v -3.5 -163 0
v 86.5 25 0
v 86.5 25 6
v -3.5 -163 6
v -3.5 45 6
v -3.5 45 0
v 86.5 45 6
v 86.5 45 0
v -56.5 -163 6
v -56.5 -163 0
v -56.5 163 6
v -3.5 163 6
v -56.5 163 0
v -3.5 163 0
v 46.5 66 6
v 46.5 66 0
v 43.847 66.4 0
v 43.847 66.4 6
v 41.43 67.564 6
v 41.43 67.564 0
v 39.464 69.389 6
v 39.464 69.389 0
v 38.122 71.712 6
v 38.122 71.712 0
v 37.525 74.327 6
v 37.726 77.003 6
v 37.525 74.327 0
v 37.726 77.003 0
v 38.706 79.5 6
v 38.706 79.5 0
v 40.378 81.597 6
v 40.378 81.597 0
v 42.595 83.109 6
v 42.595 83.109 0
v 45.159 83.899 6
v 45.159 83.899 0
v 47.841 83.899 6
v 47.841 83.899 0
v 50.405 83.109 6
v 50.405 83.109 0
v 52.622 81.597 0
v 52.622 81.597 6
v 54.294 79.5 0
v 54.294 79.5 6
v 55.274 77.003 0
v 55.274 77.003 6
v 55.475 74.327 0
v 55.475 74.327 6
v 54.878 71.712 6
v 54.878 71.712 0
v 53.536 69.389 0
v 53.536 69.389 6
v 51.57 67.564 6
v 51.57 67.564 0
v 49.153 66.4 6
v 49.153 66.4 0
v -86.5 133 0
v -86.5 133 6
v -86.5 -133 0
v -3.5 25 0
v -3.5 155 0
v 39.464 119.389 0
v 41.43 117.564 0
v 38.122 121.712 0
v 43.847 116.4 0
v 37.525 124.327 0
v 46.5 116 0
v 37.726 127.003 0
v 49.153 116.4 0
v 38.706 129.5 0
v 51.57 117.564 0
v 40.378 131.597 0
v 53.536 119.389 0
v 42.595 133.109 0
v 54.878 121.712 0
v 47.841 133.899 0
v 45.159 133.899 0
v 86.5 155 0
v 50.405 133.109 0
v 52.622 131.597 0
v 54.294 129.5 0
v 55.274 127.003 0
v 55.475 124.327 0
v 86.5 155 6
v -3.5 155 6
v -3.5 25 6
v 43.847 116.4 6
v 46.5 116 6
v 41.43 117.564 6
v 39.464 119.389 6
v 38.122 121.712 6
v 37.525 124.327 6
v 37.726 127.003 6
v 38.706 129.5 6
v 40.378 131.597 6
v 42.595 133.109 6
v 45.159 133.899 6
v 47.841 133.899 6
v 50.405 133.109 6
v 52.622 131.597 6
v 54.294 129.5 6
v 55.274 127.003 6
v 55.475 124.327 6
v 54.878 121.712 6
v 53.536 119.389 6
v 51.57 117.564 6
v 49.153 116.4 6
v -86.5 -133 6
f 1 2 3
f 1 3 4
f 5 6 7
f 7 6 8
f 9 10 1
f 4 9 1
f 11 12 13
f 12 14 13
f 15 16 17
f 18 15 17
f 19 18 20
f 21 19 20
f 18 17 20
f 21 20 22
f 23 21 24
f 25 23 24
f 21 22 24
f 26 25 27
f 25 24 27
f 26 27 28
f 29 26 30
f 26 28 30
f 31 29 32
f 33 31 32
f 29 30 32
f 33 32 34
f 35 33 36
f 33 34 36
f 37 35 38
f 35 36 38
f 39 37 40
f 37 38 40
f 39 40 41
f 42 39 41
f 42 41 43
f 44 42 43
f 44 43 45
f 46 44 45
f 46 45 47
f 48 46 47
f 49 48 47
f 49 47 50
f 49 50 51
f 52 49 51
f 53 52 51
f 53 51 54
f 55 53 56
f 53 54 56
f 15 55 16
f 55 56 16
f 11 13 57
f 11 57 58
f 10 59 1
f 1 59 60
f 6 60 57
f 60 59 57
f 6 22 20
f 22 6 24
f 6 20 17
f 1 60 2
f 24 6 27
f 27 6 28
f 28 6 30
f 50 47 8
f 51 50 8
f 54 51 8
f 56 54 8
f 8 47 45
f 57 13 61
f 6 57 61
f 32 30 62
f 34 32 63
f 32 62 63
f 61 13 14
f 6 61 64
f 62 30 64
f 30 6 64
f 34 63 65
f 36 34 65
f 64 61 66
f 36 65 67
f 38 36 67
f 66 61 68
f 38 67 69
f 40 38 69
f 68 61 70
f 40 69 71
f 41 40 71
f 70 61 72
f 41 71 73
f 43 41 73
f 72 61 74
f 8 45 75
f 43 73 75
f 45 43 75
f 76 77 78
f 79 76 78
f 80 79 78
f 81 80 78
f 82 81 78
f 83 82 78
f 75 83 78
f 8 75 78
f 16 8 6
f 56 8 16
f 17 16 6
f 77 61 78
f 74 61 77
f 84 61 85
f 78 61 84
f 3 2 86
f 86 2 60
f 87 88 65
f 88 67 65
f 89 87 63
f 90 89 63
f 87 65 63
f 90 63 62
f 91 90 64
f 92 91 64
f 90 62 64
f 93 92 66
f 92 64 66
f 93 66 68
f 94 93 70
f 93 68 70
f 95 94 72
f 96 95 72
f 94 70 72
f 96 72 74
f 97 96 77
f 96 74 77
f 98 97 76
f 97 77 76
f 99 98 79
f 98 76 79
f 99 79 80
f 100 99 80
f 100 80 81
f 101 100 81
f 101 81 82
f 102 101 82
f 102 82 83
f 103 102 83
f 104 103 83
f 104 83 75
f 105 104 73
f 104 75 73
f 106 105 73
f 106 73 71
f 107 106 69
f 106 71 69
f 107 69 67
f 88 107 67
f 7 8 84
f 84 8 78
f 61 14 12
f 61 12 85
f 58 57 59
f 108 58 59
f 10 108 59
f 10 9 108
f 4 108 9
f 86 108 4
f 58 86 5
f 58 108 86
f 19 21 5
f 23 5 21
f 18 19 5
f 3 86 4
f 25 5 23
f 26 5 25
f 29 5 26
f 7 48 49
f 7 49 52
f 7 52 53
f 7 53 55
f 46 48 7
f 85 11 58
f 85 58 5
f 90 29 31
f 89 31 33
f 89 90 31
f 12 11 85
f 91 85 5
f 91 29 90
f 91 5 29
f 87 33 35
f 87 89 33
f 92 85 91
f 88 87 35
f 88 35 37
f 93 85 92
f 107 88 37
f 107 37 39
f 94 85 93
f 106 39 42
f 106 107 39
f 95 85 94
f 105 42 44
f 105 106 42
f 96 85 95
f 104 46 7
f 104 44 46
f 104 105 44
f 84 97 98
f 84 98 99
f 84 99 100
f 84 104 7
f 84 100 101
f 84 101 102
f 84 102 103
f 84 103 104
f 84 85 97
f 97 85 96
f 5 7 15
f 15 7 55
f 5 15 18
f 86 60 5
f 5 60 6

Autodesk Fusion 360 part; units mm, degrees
sketch "スケッチ1" plane through (0, 0, 0) normal (0, 0, 1) x (1, 0, 0)
  line L0 (-86.5, -163) -> (-3.5, -163)
  line L1 (86.5, 45) -> (86.5, 155)
  line L2 (-3.5, 163) -> (-86.5, 163)
  line L3 (-86.5, 163) -> (-86.5, -163)
  line L4 (-86.5, -163) -> (82.2546, 155) construction
  line L5 (39.184, -73.838) -> (-86.5, 163) construction
  line L6 (-3.5, 163) -> (-3.5, 155)
  line L7 (-3.5, 155) -> (86.5, 155)
  line L8 (-86.5, -163) -> (-3.5, -163) construction
  line L9 (86.5, 25) -> (-3.5, -163)
  line L10 (86.5, 25) -> (-3.5, 25)
  line L11 (-3.5, 25) -> (-3.5, 45)
  line L12 (-3.5, 45) -> (86.5, 45)
  dimension "d5" = 83
  dimension "d7" = 90
  dimension "d8" = 20
extrude "押し出し1" add sketch "スケッチ1" along normal blind 6
chamfer "面取り1" distance 30 angle 45 2 edges at (-86.5, -163, 3) (-86.5, 163, 3)
sketch "スケッチ2" plane through (0, 0, 6) normal (0, 0, 1) x (-1, 0, 0)
  line L0 (56.5, -163) -> (86.5, -133)
  line L1 (86.5, -133) -> (86.5, 133)
  line L2 (86.5, 133) -> (56.5, 163)
  line L3 (56.5, 163) -> (3.5, 163)
  line L4 (3.5, 163) -> (-86.5, -25)
  line L5 (-86.5, -25) -> (3.5, -25)
  line L6 (3.5, -25) -> (3.5, -45)
  line L7 (3.5, -45) -> (-86.5, -45)
  line L8 (-86.5, -45) -> (-86.5, -155)
  line L9 (-86.5, -155) -> (3.5, -155)
  line L10 (3.5, -155) -> (3.5, -163)
  line L11 (3.5, -163) -> (56.5, -163)
  line L12 (-86.5, -155) -> (-46.5, -155) construction
  line L13 (-46.5, -155) -> (-46.5, -125) construction
  line L14 (-46.5, -125) -> (-86.5, -125) construction
  line L15 (-86.5, -125) -> (-86.5, -155) construction
  line L16 (-46.5, -125) -> (-46.5, -75) construction
  point P0 (-46.5, -125)
  point P1 (-46.5, -75)
  dimension "d12" = 40
  dimension "d13" = 30
  dimension "d14" = 50
hole "穴1" at (46.5, 125, 6) at (46.5, 75, 6) direction (0, 0, -1) diameter 18 end through all
equation "d5 = 30 mm + 53 mm"
